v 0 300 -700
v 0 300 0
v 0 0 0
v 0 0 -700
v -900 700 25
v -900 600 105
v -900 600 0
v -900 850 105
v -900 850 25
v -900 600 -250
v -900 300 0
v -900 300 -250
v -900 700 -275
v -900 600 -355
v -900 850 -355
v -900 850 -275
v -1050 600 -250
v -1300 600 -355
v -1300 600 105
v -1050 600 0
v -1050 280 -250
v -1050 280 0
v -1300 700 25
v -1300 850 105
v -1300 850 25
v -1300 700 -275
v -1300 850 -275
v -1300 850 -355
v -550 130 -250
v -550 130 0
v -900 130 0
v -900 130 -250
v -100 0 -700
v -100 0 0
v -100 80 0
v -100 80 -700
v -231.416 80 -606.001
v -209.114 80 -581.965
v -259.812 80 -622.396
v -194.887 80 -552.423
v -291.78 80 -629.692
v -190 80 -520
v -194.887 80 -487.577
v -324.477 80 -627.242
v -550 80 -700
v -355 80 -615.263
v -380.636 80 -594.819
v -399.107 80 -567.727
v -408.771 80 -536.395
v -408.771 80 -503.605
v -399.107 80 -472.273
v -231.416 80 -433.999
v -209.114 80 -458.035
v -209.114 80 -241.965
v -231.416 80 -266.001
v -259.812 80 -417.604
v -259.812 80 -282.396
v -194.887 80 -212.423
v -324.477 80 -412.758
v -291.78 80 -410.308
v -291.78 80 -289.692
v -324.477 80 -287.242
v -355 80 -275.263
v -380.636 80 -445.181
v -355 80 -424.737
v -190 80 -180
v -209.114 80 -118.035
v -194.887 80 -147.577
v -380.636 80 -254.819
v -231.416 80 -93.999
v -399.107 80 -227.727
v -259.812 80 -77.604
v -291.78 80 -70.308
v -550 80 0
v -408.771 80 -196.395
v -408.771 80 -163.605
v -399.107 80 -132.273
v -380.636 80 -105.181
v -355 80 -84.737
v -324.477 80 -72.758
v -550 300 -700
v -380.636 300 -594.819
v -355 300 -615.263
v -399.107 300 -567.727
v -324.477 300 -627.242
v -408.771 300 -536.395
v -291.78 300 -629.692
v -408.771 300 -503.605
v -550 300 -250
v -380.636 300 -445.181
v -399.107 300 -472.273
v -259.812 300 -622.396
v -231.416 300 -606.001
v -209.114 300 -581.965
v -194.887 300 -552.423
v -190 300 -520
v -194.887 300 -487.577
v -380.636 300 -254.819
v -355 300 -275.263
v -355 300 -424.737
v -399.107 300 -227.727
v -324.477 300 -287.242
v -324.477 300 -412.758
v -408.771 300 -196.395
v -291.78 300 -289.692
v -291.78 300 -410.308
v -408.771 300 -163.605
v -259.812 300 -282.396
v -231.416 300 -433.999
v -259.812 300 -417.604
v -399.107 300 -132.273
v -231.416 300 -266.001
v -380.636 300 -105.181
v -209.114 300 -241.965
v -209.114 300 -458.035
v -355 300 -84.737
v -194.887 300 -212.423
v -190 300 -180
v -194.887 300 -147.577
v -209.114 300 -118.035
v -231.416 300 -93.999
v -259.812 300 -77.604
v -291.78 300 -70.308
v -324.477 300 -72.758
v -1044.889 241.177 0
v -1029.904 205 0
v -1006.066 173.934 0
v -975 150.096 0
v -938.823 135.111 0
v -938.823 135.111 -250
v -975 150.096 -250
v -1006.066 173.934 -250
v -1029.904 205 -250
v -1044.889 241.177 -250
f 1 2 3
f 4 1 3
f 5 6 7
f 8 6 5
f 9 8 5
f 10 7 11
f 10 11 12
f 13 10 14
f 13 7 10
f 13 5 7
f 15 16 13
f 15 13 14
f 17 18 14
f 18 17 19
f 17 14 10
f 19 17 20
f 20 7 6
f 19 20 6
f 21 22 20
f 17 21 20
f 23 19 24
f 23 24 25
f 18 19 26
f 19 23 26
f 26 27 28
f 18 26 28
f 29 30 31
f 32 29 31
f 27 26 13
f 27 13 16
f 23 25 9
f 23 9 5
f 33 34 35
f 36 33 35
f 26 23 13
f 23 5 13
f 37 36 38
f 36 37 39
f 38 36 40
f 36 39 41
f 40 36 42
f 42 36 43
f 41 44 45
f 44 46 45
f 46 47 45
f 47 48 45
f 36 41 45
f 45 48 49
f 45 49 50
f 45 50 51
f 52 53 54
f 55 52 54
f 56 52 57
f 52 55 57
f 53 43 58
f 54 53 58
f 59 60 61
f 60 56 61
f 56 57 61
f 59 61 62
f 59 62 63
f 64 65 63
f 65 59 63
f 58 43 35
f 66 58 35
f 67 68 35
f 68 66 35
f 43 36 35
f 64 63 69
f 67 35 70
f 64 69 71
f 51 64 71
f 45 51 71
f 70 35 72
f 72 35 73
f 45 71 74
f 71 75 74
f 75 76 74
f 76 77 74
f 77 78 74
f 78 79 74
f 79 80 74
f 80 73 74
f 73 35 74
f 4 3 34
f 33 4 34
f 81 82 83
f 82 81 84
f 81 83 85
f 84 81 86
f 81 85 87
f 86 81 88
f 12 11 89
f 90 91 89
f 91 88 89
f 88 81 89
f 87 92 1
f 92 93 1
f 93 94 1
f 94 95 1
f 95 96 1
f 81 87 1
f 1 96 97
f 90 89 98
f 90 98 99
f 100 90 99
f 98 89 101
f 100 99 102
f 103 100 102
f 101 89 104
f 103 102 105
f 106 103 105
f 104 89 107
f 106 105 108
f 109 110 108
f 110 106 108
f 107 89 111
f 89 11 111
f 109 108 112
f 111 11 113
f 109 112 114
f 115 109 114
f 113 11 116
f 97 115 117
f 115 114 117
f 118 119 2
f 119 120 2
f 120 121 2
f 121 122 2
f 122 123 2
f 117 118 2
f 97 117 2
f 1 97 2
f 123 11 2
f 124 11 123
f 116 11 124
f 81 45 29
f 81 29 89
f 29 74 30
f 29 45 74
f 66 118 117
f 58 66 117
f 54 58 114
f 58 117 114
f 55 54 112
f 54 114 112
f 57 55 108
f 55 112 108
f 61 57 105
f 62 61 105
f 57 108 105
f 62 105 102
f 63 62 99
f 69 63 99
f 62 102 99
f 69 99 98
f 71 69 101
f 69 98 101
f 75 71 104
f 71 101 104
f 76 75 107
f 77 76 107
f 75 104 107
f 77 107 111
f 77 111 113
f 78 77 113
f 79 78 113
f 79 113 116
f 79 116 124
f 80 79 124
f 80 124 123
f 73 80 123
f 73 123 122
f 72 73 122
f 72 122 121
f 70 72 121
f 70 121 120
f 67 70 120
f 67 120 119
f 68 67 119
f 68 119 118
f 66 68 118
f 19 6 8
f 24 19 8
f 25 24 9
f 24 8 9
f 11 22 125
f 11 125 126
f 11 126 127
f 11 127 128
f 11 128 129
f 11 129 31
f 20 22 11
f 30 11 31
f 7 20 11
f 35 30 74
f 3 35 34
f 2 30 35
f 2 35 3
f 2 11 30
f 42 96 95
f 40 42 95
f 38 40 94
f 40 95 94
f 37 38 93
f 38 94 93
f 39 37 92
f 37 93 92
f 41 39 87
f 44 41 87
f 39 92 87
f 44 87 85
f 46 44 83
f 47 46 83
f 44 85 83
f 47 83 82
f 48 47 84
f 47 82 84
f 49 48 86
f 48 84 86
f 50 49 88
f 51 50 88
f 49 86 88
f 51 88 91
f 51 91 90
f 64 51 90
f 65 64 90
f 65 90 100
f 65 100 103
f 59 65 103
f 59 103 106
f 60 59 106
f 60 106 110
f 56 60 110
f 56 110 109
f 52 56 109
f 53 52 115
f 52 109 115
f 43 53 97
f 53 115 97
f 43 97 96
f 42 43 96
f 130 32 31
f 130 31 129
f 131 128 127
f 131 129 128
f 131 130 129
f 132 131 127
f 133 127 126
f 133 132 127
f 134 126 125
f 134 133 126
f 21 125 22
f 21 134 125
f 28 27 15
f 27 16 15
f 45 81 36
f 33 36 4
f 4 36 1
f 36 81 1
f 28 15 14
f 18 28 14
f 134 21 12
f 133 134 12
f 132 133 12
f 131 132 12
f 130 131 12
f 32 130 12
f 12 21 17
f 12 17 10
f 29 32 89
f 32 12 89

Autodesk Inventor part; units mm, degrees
ref_plane "YZ Plane" through (0, 0, 0) normal (1, 0, 0) x (0, 1, 0)
ref_plane "XZ Plane" through (0, 0, 0) normal (0, 1, 0) x (-1, 0, 0)
ref_plane "XY Plane" through (0, 0, 0) normal (0, 0, 1) x (1, 0, 0)
sketch "Sketch1" plane through (0, 0, 0) normal (0, 0, 1) x (1, 0, 0)
  line L0 (0, 0) -> (-100, 0)
  line L1 (-100, 0) -> (-100, 80)
  line L2 (-100, 80) -> (-550, 80)
  line L3 (-550, 80) -> (-550, 130)
  line L4 (-550, 130) -> (-1050, 130)
  line L5 (-1050, 130) -> (-1050, 600)
  line L6 (-1050, 600) -> (-900, 600)
  line L7 (-900, 600) -> (-900, 300)
  line L8 (-900, 300) -> (0, 300)
  line L9 (0, 300) -> (0, 0)
  line L10 (-550, 130) -> (-550, 300)
  dimension "d0" = 100
  dimension "d1" = 80
  dimension "d2" = 450
  dimension "d3" = 50
  dimension "d4" = 500
  dimension "d5" = 470
  dimension "d6" = 150
  dimension "d7" = 300
extrude "Extrusion1" add sketch "Sketch1" against normal blind 700 contours L0 L1 L2 L3 L10 L8 L9
sketch "Sketch2" plane through (0, 0, 0) normal (0, 0, 1) x (1, 0, 0)
  line L0 (-100, 80) -> (-550, 80) construction
  line L1 (-550, 80) -> (-550, 130)
  line L2 (-550, 80) -> (-550, 300) construction
  line L3 (-550, 130) -> (-1050, 130)
  line L4 (-1050, 130) -> (-1050, 600)
  line L5 (-1050, 600) -> (-900, 600)
  line L6 (-900, 600) -> (-900, 300)
  line L7 (-900, 300) -> (-550, 300)
  line L8 (-550, 300) -> (-550, 80) construction
  line L9 (-550, 130) -> (-550, 300)
  point P0 (0, 0)
  dimension "d10" = 50
  dimension "d11" = 500
  dimension "d12" = 470
  dimension "d13" = 150
  dimension "d14" = 300
extrude "Extrusion2" add sketch "Sketch2" against normal blind 250
sketch "Sketch3" plane through (-900, 300, 0) normal (1, 0, 0) x (0, 0, -1)
  line L0 (0, 300) -> (250, 300) construction
  line L1 (0, 300) -> (-105, 300)
  line L2 (-105, 300) -> (-105, 550)
  line L3 (-105, 550) -> (-25, 550)
  line L4 (-25, 550) -> (-25, 400)
  line L5 (-25, 400) -> (275, 400)
  line L6 (275, 400) -> (275, 550)
  line L7 (275, 550) -> (355, 550)
  line L8 (355, 550) -> (355, 300)
  line L9 (355, 300) -> (0, 300)
  point P0 (0, -300)
  dimension "d17" = 105
  dimension "d18" = 250
  dimension "d19" = 80
  dimension "d20" = 150
  dimension "d21" = 300
  dimension "d22" = 80
extrude "Extrusion3" add sketch "Sketch3" against normal blind 400
fillet "Fillet1" radius 150 1 edges at (-1050, 130, -125)
sketch "Sketch4" plane through (-550, 300, -700) normal (0, 1, 0) x (1, 0, 0)
  line L0 (450, -700) -> (550, -700) construction
  line L1 (550, -700) -> (550, -520)
  line L2 (550, -520) -> (250, -520)
  line L3 (250, -520) -> (250, -180)
  circle A0 centre (250, -520) radius 110
  circle A1 centre (250, -180) radius 110
  dimension "d26" = 180
  dimension "d27" = 300
  dimension "d28" = 340
  dimension "d29" = 220
  dimension "d30" = 220
extrude "Extrusion4" cut sketch "Sketch4" against normal blind 449.2125
properties part number "051665019_14"
